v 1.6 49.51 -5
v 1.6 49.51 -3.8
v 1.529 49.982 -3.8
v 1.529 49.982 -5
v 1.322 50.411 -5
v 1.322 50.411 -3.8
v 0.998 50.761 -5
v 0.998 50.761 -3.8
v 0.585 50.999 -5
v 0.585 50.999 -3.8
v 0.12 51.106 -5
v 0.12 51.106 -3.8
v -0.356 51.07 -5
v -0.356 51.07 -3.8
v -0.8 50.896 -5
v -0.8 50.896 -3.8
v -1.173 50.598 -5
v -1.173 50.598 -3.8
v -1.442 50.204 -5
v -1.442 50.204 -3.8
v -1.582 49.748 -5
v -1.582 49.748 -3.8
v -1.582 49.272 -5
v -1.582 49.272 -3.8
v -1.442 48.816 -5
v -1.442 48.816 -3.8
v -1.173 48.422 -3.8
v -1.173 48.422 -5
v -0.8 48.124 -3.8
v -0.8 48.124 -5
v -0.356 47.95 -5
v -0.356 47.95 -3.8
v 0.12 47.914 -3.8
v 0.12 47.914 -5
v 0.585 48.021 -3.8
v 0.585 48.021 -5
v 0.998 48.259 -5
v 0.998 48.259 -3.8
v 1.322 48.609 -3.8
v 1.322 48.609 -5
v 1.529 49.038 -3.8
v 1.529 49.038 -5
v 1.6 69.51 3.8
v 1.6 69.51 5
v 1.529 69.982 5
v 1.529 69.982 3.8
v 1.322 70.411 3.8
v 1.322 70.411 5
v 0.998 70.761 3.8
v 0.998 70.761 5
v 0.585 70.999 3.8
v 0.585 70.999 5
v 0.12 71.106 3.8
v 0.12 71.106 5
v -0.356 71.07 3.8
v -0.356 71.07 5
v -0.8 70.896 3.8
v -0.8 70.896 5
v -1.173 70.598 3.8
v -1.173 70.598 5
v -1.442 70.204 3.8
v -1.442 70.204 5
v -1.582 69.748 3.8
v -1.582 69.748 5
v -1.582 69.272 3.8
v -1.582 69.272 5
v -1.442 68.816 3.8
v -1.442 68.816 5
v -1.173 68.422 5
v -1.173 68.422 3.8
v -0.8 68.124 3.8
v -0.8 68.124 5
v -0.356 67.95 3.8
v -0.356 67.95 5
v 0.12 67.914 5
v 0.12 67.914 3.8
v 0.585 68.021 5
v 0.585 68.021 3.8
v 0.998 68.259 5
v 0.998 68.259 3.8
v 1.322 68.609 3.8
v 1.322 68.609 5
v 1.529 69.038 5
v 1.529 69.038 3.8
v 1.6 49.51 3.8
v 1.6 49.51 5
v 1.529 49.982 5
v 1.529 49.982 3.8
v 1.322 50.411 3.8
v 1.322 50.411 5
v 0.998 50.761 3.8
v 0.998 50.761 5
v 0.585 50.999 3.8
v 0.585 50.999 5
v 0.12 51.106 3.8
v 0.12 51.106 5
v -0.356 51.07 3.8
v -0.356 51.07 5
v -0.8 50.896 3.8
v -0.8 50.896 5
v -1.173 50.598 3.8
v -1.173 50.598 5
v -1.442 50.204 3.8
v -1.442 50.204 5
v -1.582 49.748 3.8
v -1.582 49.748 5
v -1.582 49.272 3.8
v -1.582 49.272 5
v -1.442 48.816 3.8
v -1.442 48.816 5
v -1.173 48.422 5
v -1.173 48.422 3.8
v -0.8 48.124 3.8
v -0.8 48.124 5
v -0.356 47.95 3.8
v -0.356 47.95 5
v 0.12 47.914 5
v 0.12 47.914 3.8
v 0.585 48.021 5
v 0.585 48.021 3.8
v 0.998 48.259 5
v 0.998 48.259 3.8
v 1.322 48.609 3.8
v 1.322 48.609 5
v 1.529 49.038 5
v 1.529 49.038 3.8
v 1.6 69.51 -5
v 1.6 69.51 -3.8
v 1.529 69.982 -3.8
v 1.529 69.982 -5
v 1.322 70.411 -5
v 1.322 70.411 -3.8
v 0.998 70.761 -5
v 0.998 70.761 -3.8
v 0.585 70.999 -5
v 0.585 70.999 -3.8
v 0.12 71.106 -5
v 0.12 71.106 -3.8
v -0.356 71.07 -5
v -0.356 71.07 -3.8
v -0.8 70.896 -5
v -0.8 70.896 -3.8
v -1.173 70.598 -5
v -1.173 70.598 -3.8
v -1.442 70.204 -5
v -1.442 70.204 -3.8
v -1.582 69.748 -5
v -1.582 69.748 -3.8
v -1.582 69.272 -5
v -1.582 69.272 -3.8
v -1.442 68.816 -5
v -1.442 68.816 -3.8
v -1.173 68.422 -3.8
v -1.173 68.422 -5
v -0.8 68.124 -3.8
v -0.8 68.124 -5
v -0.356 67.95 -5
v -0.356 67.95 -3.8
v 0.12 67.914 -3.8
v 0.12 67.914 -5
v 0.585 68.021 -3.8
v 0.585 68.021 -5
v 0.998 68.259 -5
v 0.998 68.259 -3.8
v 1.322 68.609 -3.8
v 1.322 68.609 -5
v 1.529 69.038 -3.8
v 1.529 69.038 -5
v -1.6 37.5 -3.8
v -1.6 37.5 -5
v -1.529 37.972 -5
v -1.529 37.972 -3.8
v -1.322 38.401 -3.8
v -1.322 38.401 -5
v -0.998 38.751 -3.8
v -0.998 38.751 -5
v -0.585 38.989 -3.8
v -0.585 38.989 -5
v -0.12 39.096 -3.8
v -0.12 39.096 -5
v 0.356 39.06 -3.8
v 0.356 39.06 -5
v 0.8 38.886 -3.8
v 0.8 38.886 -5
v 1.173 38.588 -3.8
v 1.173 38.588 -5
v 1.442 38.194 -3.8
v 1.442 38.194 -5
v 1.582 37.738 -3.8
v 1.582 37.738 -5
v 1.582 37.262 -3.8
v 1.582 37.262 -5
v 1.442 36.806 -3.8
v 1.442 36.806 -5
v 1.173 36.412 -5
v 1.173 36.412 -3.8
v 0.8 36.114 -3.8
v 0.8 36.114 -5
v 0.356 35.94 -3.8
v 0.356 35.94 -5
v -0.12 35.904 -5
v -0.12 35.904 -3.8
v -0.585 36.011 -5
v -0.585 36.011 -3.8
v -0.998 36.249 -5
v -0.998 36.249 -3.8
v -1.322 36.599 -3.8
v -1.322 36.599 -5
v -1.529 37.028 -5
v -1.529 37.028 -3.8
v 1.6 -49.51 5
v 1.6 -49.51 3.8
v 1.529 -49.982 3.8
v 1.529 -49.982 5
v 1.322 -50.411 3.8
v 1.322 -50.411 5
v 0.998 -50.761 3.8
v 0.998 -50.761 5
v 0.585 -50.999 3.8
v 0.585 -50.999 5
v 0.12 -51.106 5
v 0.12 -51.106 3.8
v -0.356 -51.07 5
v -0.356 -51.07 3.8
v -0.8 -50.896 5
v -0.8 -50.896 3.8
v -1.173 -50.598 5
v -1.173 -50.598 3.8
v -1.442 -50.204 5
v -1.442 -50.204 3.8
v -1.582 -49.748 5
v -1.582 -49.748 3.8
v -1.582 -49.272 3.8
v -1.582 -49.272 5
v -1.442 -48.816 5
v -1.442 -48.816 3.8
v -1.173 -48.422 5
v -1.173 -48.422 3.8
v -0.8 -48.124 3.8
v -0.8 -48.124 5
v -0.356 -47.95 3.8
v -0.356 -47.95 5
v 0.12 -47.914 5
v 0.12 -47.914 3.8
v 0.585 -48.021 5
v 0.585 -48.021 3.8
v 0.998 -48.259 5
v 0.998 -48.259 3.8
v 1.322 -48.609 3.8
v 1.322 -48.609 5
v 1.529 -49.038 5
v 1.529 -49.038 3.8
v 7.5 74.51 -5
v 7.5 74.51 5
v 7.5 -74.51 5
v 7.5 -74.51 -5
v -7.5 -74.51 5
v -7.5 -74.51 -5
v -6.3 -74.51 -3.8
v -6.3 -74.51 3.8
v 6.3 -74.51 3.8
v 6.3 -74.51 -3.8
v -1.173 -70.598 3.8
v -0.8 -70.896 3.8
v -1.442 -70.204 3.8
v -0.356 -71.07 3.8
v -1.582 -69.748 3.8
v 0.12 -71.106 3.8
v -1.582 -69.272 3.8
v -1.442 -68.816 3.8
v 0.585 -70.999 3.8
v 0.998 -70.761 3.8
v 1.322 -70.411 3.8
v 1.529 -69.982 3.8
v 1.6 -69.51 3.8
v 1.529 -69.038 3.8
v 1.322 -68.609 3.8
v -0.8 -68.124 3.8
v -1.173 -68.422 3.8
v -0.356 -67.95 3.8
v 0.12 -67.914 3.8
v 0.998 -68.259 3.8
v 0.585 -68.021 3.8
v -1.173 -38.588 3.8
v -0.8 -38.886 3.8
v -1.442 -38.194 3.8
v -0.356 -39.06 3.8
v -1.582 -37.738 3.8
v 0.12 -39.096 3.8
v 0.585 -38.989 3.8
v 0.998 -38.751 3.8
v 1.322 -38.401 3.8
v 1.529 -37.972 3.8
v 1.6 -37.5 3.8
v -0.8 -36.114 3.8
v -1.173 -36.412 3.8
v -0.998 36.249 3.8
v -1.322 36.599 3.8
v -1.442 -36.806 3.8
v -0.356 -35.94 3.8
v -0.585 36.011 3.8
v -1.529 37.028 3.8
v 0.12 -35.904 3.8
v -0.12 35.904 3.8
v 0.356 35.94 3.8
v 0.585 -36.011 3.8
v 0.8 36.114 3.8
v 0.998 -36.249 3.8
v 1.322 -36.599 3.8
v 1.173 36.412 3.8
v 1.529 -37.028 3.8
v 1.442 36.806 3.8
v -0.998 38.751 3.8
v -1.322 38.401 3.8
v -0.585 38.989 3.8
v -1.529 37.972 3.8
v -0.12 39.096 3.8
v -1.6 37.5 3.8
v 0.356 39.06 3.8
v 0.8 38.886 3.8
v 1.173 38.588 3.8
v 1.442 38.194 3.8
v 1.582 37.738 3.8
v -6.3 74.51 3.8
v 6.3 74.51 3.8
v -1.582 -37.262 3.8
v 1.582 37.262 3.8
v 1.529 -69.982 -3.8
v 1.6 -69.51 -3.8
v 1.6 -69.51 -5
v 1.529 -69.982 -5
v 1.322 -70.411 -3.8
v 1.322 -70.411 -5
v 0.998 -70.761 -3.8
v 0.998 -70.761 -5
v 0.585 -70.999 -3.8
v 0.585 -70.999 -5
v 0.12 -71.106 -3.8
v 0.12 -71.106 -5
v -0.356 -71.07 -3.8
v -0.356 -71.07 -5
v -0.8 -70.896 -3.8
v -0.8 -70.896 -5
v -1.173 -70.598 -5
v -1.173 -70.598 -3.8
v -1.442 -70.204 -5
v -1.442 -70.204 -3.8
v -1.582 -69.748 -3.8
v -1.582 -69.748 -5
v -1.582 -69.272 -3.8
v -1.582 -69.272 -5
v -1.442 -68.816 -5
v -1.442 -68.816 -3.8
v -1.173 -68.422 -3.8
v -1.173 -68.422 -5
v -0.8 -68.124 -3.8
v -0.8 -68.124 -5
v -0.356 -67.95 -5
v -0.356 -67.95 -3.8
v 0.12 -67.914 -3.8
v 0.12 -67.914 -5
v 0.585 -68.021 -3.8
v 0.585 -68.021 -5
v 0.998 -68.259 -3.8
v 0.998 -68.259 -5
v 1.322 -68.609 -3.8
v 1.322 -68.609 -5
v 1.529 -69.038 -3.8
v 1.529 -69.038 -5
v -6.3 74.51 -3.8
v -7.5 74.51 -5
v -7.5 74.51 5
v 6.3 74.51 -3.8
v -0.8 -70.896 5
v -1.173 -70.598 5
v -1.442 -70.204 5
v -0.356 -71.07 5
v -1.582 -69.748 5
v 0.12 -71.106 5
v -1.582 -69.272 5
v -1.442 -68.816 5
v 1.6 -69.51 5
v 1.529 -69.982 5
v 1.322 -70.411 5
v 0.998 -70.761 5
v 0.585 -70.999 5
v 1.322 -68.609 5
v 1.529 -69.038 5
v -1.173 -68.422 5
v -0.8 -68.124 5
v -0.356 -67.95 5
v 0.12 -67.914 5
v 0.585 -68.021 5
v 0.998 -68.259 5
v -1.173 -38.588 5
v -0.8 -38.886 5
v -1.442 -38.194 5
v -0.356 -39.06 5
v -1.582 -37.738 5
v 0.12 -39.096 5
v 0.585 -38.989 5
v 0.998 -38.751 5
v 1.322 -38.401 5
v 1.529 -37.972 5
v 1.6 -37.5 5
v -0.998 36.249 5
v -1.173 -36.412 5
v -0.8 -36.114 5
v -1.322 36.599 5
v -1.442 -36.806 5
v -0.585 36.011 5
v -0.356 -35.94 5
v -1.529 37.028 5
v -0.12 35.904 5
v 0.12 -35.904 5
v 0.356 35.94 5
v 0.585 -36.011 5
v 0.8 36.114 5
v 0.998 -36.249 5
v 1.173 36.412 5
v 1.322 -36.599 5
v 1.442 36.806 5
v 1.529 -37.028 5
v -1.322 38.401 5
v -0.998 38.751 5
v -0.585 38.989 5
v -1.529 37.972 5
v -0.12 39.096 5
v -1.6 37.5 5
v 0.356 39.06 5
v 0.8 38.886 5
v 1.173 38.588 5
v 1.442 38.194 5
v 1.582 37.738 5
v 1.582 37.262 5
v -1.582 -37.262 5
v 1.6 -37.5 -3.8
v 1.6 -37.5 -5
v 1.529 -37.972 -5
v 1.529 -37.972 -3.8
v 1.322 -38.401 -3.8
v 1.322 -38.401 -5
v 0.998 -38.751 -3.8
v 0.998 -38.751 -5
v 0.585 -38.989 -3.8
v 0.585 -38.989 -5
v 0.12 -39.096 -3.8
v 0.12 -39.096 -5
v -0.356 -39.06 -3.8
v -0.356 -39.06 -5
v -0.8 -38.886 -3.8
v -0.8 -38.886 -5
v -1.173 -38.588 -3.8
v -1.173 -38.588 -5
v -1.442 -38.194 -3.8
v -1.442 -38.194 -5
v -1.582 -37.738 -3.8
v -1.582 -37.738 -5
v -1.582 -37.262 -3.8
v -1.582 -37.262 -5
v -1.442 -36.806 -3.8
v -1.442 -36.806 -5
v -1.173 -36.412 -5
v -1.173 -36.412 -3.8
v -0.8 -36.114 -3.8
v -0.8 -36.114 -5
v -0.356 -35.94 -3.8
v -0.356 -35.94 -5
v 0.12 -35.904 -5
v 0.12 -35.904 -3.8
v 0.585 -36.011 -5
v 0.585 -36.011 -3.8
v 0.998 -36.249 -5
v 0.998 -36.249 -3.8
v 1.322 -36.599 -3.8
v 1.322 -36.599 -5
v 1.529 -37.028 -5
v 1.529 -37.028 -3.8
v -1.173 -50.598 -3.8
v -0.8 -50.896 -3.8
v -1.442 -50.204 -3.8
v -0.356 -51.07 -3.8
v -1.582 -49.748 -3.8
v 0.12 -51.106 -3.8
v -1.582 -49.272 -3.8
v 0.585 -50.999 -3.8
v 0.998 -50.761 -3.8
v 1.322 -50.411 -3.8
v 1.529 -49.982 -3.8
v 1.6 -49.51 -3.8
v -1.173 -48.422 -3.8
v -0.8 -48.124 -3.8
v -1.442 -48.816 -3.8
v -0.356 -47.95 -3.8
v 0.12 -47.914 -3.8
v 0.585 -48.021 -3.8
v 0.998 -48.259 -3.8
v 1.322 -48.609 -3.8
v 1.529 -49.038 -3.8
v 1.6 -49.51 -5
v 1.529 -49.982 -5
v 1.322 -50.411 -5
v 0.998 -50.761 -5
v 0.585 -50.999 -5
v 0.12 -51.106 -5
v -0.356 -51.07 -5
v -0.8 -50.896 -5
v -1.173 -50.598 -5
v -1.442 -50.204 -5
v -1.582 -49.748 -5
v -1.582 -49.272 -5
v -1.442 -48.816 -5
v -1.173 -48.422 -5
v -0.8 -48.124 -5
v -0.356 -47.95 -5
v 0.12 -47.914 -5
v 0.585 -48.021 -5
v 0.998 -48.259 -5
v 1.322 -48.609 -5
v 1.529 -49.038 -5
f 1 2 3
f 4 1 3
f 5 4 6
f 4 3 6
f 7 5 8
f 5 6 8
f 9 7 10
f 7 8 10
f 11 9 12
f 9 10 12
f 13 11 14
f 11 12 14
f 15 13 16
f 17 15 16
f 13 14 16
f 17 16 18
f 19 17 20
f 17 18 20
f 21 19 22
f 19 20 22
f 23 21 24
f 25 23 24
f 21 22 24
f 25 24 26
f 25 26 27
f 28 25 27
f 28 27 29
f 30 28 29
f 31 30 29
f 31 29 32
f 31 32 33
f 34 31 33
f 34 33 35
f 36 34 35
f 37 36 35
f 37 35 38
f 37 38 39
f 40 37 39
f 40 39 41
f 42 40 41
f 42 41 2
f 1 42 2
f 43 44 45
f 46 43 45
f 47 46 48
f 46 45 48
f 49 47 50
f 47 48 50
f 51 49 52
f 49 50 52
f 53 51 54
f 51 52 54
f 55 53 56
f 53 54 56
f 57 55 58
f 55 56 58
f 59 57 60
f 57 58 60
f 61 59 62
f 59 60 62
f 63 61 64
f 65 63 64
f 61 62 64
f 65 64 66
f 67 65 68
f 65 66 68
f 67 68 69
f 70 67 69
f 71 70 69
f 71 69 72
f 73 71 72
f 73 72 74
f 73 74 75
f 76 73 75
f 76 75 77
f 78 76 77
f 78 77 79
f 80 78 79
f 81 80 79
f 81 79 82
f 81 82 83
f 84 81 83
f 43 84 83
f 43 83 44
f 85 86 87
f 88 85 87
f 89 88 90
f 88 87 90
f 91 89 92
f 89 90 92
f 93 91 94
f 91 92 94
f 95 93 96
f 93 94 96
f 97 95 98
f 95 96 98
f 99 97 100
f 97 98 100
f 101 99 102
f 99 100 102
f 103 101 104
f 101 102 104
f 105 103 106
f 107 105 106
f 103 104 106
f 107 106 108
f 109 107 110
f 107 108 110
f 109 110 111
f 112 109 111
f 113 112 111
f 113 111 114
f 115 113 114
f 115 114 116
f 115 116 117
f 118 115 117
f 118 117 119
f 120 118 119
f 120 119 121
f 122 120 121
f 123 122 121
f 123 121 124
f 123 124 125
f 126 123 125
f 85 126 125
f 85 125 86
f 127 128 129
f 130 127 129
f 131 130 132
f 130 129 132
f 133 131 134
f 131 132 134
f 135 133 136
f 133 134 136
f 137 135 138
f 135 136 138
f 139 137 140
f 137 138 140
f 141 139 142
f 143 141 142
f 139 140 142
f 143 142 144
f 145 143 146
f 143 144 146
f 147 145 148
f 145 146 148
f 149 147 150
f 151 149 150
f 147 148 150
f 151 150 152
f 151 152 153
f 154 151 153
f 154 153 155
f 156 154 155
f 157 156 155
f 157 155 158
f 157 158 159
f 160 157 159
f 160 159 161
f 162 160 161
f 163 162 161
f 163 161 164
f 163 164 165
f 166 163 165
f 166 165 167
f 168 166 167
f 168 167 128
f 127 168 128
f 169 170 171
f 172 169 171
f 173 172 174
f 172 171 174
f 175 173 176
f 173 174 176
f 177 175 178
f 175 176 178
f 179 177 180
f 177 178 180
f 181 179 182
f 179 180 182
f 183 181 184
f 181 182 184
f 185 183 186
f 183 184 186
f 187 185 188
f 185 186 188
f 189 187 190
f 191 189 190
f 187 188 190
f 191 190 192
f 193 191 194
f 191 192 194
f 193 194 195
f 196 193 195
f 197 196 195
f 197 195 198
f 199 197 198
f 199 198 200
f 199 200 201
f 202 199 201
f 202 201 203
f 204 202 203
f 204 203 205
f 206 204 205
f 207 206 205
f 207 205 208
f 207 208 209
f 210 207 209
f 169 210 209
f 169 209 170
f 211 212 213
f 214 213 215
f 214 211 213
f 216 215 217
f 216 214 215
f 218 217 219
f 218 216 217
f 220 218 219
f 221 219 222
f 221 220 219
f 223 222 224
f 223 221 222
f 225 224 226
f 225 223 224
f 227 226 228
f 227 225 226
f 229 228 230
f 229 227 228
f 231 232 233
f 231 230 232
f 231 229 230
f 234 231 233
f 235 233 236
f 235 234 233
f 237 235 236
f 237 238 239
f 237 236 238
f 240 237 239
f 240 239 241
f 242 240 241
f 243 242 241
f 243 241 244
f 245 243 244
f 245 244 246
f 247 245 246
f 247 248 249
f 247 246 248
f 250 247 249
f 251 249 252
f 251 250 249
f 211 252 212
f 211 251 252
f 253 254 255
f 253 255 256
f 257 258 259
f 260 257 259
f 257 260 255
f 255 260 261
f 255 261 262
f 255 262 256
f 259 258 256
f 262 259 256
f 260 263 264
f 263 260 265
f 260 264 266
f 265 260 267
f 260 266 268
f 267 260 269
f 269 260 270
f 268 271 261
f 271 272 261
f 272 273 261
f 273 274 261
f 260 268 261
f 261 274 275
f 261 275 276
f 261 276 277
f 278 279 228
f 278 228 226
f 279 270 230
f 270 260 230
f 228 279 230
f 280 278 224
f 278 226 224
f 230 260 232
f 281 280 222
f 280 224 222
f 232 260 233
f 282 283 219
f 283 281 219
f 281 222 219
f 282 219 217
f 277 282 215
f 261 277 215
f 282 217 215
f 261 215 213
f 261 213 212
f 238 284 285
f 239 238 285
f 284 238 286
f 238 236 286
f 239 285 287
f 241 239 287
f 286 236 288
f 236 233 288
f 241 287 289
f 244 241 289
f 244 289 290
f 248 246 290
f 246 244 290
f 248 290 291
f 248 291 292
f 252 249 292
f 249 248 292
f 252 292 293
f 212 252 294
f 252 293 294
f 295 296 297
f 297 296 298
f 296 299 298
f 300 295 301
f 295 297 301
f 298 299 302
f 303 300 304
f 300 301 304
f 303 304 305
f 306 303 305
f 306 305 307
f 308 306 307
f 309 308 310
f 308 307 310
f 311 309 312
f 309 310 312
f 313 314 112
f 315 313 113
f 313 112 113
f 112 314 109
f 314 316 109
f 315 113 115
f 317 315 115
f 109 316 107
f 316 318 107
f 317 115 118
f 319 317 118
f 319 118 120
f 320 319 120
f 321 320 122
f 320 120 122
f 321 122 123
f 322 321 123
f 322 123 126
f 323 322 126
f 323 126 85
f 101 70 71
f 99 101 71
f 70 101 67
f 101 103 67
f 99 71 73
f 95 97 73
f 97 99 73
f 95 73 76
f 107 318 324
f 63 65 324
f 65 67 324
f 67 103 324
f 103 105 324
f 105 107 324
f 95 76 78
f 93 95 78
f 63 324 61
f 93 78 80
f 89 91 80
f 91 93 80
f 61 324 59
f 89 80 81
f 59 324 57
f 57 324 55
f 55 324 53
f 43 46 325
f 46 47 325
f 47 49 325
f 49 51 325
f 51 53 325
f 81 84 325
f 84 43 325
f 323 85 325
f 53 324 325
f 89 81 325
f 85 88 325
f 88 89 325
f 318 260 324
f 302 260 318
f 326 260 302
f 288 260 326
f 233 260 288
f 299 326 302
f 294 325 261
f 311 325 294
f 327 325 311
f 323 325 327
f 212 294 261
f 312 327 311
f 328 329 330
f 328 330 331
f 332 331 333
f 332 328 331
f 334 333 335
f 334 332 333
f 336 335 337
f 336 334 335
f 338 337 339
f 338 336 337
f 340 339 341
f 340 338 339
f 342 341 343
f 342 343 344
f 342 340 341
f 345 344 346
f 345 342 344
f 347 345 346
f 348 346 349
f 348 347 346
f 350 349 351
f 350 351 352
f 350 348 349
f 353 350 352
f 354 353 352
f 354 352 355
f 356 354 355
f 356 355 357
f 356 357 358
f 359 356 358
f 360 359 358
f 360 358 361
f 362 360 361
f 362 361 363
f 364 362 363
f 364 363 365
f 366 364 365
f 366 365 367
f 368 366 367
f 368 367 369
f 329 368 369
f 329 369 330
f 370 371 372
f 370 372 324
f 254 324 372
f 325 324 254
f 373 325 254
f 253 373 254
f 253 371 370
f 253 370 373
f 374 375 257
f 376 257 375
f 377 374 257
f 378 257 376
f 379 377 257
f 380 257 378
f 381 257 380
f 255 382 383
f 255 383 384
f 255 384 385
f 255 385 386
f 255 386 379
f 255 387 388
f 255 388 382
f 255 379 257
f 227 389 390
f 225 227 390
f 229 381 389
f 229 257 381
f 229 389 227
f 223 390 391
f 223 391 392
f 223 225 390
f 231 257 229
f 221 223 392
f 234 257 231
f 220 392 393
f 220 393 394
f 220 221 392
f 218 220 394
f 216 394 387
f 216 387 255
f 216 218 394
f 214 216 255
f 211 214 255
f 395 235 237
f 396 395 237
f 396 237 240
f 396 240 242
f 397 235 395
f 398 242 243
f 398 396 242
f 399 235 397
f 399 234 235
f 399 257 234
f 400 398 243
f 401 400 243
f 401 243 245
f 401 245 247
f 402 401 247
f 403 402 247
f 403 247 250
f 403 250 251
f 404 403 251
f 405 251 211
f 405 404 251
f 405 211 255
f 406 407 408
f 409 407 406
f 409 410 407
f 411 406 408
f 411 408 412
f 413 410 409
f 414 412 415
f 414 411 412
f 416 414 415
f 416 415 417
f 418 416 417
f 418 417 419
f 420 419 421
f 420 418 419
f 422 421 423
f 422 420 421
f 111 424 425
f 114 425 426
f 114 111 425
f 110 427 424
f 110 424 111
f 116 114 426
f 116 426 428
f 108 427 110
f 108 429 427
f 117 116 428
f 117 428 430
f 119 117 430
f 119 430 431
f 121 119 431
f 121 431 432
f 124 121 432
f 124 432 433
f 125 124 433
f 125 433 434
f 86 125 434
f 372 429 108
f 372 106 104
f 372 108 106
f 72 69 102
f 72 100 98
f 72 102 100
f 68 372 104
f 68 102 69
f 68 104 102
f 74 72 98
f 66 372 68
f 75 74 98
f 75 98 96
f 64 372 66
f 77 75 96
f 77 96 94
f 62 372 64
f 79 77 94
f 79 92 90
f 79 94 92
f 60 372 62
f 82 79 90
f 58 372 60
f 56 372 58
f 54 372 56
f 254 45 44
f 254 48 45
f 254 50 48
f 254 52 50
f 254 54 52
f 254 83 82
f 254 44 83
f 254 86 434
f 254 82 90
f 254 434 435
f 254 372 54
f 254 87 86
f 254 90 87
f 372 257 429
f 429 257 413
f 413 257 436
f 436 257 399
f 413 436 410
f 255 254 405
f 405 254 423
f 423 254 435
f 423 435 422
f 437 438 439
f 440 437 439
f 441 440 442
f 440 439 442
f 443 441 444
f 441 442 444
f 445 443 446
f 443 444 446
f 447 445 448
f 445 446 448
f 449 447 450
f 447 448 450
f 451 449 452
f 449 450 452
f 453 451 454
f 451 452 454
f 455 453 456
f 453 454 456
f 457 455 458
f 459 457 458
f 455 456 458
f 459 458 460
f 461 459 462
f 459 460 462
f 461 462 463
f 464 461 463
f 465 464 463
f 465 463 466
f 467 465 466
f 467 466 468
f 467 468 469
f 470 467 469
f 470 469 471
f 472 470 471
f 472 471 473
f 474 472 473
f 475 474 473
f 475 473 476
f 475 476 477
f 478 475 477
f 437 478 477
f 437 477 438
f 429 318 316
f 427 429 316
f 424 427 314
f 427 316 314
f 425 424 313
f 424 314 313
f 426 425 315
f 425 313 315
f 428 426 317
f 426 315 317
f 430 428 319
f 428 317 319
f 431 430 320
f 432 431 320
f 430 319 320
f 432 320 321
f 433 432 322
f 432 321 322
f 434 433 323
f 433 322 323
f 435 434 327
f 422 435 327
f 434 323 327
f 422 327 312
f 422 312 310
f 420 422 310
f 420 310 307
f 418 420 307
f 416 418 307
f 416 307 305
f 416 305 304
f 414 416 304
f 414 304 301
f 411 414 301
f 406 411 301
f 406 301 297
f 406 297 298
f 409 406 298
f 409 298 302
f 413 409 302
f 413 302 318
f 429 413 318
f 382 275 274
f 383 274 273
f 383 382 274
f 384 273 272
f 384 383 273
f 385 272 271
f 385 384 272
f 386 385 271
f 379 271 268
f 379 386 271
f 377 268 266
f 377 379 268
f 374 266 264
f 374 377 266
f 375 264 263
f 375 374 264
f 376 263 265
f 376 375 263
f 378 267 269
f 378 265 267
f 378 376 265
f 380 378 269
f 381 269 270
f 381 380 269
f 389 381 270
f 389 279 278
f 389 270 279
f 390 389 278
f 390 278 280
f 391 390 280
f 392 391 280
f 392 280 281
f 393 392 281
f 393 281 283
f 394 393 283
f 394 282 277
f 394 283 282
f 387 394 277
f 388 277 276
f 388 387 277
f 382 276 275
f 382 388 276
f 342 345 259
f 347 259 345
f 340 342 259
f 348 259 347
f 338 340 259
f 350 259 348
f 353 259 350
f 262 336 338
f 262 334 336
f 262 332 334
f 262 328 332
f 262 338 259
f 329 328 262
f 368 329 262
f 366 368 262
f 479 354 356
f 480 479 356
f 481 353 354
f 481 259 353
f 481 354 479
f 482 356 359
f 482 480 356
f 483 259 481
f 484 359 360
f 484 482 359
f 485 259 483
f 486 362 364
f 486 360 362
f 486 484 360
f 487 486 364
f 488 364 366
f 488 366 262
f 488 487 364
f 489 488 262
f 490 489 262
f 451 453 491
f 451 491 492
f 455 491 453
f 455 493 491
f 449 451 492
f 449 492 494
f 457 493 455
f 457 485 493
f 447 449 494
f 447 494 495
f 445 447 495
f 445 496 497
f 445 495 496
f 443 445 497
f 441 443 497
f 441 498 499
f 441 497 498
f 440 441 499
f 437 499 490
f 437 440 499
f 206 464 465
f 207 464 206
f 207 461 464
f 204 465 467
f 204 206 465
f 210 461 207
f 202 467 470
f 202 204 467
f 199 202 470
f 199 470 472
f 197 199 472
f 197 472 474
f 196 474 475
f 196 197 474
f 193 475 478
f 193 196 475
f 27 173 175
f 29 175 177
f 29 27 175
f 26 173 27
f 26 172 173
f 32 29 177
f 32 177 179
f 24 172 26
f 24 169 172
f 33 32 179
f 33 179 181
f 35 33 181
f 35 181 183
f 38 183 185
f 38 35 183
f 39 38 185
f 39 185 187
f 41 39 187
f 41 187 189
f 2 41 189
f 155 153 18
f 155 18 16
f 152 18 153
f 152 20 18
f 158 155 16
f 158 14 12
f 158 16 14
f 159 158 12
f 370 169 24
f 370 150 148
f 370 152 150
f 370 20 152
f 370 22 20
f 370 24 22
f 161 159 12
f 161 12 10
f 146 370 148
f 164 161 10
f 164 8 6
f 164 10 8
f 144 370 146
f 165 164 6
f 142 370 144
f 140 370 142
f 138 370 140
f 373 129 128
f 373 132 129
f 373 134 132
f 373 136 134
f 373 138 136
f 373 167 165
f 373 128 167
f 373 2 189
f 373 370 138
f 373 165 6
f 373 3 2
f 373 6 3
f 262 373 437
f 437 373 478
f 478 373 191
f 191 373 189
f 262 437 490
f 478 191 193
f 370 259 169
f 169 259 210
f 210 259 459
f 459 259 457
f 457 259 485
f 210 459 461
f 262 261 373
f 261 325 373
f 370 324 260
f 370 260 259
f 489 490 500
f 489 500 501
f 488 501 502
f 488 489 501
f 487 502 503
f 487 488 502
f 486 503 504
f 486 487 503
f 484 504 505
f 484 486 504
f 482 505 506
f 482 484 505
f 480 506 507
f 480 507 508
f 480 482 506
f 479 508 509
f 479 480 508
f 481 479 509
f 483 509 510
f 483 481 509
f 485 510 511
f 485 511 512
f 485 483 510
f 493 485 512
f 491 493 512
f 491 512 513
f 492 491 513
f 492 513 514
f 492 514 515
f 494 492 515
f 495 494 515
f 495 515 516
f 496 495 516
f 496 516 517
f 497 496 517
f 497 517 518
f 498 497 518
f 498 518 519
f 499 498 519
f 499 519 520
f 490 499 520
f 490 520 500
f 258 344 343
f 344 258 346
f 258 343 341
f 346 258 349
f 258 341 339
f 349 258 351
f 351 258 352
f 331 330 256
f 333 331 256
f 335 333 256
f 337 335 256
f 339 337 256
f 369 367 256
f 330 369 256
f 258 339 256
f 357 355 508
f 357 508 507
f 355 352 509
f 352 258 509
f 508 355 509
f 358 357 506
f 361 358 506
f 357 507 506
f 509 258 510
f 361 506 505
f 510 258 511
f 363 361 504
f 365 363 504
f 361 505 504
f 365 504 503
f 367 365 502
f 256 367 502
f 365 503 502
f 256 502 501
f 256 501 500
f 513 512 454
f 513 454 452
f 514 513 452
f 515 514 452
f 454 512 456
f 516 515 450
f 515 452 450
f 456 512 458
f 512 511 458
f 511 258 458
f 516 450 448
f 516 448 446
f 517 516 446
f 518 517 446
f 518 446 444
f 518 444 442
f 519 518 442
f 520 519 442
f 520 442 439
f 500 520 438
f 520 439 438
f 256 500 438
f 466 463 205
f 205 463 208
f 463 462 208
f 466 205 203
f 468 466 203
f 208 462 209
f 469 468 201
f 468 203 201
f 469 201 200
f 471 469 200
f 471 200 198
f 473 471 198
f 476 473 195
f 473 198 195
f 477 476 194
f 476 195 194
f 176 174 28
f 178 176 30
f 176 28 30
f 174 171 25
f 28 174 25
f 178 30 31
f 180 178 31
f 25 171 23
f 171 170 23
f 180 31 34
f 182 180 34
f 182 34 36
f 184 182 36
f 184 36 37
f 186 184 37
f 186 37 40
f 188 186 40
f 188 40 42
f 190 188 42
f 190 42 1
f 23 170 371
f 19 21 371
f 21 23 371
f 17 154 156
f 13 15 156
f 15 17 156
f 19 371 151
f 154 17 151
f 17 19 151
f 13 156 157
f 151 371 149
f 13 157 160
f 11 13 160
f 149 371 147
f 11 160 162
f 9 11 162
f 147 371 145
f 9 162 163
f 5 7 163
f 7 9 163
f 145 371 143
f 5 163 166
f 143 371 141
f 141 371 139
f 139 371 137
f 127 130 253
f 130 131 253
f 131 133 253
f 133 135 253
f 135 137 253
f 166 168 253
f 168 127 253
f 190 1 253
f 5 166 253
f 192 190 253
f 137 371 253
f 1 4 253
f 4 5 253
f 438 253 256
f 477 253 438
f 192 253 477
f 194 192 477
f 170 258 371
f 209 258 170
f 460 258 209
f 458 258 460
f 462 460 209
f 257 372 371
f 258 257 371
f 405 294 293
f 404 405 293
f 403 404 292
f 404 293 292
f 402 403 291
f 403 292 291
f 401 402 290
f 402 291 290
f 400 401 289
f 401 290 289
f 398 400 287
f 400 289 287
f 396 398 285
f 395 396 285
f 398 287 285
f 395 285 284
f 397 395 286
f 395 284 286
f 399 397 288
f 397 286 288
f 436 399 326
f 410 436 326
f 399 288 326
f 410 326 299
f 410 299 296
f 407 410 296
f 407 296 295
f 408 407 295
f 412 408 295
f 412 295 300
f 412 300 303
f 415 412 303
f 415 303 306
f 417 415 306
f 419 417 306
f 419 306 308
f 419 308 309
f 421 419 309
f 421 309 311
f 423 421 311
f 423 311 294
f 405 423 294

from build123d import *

# Parameters (mm, degrees)
SKETCH_1_W          = 15
SKETCH_1_H          = 10
SKETCH_1_W_2        = 12.6
SKETCH_1_H_2        = 7.6
EXTRUDE_1_DEPTH     = 74.51
SKETCH_3_R          = 1.6
CUT_EXTRUDE_1_DEPTH = 10
SKETCH_4_R          = 1.6
CUT_EXTRUDE_2_DEPTH = 10


with BuildPart() as part:
    # ｽｹｯﾁ1 → ﾎﾞｽ - 押し出し1 (new, symmetric)
    with BuildSketch(Plane(origin=(0, 0, 0), x_dir=(1, 0, 0), z_dir=(0, 1, 0))):
        Rectangle(SKETCH_1_W, SKETCH_1_H)
        Rectangle(SKETCH_1_W_2, SKETCH_1_H_2, mode=Mode.SUBTRACT)
    extrude(amount=EXTRUDE_1_DEPTH, both=True)

    # ｽｹｯﾁ3 → ｶｯﾄ - 押し出し1 (cut)
    with BuildSketch(Plane.XY.offset(5)):
        with Locations((0, 49.51)):
            Circle(SKETCH_3_R)
        with Locations((0, 69.51)):
            Circle(SKETCH_3_R)
    cut_extrude_1 = extrude(amount=-CUT_EXTRUDE_1_DEPTH, mode=Mode.SUBTRACT)

    # ﾐﾗｰ1: ｶｯﾄ - 押し出し1 across plane
    add(cut_extrude_1.mirror(Plane.ZX), mode=Mode.SUBTRACT)

    # ｽｹｯﾁ4 → ｶｯﾄ - 押し出し2 (cut)
    with BuildSketch(Plane(origin=(0, 0, -5), x_dir=(-1, 0, 0), z_dir=(0, 0, -1))):
        with Locations((0, 37.5)):
            Circle(SKETCH_4_R)
        with Locations(Location((0, -37.5, 0), (0, 0, 180))):
            Circle(SKETCH_4_R)
    extrude(amount=-CUT_EXTRUDE_2_DEPTH, mode=Mode.SUBTRACT)


solid = part.part
